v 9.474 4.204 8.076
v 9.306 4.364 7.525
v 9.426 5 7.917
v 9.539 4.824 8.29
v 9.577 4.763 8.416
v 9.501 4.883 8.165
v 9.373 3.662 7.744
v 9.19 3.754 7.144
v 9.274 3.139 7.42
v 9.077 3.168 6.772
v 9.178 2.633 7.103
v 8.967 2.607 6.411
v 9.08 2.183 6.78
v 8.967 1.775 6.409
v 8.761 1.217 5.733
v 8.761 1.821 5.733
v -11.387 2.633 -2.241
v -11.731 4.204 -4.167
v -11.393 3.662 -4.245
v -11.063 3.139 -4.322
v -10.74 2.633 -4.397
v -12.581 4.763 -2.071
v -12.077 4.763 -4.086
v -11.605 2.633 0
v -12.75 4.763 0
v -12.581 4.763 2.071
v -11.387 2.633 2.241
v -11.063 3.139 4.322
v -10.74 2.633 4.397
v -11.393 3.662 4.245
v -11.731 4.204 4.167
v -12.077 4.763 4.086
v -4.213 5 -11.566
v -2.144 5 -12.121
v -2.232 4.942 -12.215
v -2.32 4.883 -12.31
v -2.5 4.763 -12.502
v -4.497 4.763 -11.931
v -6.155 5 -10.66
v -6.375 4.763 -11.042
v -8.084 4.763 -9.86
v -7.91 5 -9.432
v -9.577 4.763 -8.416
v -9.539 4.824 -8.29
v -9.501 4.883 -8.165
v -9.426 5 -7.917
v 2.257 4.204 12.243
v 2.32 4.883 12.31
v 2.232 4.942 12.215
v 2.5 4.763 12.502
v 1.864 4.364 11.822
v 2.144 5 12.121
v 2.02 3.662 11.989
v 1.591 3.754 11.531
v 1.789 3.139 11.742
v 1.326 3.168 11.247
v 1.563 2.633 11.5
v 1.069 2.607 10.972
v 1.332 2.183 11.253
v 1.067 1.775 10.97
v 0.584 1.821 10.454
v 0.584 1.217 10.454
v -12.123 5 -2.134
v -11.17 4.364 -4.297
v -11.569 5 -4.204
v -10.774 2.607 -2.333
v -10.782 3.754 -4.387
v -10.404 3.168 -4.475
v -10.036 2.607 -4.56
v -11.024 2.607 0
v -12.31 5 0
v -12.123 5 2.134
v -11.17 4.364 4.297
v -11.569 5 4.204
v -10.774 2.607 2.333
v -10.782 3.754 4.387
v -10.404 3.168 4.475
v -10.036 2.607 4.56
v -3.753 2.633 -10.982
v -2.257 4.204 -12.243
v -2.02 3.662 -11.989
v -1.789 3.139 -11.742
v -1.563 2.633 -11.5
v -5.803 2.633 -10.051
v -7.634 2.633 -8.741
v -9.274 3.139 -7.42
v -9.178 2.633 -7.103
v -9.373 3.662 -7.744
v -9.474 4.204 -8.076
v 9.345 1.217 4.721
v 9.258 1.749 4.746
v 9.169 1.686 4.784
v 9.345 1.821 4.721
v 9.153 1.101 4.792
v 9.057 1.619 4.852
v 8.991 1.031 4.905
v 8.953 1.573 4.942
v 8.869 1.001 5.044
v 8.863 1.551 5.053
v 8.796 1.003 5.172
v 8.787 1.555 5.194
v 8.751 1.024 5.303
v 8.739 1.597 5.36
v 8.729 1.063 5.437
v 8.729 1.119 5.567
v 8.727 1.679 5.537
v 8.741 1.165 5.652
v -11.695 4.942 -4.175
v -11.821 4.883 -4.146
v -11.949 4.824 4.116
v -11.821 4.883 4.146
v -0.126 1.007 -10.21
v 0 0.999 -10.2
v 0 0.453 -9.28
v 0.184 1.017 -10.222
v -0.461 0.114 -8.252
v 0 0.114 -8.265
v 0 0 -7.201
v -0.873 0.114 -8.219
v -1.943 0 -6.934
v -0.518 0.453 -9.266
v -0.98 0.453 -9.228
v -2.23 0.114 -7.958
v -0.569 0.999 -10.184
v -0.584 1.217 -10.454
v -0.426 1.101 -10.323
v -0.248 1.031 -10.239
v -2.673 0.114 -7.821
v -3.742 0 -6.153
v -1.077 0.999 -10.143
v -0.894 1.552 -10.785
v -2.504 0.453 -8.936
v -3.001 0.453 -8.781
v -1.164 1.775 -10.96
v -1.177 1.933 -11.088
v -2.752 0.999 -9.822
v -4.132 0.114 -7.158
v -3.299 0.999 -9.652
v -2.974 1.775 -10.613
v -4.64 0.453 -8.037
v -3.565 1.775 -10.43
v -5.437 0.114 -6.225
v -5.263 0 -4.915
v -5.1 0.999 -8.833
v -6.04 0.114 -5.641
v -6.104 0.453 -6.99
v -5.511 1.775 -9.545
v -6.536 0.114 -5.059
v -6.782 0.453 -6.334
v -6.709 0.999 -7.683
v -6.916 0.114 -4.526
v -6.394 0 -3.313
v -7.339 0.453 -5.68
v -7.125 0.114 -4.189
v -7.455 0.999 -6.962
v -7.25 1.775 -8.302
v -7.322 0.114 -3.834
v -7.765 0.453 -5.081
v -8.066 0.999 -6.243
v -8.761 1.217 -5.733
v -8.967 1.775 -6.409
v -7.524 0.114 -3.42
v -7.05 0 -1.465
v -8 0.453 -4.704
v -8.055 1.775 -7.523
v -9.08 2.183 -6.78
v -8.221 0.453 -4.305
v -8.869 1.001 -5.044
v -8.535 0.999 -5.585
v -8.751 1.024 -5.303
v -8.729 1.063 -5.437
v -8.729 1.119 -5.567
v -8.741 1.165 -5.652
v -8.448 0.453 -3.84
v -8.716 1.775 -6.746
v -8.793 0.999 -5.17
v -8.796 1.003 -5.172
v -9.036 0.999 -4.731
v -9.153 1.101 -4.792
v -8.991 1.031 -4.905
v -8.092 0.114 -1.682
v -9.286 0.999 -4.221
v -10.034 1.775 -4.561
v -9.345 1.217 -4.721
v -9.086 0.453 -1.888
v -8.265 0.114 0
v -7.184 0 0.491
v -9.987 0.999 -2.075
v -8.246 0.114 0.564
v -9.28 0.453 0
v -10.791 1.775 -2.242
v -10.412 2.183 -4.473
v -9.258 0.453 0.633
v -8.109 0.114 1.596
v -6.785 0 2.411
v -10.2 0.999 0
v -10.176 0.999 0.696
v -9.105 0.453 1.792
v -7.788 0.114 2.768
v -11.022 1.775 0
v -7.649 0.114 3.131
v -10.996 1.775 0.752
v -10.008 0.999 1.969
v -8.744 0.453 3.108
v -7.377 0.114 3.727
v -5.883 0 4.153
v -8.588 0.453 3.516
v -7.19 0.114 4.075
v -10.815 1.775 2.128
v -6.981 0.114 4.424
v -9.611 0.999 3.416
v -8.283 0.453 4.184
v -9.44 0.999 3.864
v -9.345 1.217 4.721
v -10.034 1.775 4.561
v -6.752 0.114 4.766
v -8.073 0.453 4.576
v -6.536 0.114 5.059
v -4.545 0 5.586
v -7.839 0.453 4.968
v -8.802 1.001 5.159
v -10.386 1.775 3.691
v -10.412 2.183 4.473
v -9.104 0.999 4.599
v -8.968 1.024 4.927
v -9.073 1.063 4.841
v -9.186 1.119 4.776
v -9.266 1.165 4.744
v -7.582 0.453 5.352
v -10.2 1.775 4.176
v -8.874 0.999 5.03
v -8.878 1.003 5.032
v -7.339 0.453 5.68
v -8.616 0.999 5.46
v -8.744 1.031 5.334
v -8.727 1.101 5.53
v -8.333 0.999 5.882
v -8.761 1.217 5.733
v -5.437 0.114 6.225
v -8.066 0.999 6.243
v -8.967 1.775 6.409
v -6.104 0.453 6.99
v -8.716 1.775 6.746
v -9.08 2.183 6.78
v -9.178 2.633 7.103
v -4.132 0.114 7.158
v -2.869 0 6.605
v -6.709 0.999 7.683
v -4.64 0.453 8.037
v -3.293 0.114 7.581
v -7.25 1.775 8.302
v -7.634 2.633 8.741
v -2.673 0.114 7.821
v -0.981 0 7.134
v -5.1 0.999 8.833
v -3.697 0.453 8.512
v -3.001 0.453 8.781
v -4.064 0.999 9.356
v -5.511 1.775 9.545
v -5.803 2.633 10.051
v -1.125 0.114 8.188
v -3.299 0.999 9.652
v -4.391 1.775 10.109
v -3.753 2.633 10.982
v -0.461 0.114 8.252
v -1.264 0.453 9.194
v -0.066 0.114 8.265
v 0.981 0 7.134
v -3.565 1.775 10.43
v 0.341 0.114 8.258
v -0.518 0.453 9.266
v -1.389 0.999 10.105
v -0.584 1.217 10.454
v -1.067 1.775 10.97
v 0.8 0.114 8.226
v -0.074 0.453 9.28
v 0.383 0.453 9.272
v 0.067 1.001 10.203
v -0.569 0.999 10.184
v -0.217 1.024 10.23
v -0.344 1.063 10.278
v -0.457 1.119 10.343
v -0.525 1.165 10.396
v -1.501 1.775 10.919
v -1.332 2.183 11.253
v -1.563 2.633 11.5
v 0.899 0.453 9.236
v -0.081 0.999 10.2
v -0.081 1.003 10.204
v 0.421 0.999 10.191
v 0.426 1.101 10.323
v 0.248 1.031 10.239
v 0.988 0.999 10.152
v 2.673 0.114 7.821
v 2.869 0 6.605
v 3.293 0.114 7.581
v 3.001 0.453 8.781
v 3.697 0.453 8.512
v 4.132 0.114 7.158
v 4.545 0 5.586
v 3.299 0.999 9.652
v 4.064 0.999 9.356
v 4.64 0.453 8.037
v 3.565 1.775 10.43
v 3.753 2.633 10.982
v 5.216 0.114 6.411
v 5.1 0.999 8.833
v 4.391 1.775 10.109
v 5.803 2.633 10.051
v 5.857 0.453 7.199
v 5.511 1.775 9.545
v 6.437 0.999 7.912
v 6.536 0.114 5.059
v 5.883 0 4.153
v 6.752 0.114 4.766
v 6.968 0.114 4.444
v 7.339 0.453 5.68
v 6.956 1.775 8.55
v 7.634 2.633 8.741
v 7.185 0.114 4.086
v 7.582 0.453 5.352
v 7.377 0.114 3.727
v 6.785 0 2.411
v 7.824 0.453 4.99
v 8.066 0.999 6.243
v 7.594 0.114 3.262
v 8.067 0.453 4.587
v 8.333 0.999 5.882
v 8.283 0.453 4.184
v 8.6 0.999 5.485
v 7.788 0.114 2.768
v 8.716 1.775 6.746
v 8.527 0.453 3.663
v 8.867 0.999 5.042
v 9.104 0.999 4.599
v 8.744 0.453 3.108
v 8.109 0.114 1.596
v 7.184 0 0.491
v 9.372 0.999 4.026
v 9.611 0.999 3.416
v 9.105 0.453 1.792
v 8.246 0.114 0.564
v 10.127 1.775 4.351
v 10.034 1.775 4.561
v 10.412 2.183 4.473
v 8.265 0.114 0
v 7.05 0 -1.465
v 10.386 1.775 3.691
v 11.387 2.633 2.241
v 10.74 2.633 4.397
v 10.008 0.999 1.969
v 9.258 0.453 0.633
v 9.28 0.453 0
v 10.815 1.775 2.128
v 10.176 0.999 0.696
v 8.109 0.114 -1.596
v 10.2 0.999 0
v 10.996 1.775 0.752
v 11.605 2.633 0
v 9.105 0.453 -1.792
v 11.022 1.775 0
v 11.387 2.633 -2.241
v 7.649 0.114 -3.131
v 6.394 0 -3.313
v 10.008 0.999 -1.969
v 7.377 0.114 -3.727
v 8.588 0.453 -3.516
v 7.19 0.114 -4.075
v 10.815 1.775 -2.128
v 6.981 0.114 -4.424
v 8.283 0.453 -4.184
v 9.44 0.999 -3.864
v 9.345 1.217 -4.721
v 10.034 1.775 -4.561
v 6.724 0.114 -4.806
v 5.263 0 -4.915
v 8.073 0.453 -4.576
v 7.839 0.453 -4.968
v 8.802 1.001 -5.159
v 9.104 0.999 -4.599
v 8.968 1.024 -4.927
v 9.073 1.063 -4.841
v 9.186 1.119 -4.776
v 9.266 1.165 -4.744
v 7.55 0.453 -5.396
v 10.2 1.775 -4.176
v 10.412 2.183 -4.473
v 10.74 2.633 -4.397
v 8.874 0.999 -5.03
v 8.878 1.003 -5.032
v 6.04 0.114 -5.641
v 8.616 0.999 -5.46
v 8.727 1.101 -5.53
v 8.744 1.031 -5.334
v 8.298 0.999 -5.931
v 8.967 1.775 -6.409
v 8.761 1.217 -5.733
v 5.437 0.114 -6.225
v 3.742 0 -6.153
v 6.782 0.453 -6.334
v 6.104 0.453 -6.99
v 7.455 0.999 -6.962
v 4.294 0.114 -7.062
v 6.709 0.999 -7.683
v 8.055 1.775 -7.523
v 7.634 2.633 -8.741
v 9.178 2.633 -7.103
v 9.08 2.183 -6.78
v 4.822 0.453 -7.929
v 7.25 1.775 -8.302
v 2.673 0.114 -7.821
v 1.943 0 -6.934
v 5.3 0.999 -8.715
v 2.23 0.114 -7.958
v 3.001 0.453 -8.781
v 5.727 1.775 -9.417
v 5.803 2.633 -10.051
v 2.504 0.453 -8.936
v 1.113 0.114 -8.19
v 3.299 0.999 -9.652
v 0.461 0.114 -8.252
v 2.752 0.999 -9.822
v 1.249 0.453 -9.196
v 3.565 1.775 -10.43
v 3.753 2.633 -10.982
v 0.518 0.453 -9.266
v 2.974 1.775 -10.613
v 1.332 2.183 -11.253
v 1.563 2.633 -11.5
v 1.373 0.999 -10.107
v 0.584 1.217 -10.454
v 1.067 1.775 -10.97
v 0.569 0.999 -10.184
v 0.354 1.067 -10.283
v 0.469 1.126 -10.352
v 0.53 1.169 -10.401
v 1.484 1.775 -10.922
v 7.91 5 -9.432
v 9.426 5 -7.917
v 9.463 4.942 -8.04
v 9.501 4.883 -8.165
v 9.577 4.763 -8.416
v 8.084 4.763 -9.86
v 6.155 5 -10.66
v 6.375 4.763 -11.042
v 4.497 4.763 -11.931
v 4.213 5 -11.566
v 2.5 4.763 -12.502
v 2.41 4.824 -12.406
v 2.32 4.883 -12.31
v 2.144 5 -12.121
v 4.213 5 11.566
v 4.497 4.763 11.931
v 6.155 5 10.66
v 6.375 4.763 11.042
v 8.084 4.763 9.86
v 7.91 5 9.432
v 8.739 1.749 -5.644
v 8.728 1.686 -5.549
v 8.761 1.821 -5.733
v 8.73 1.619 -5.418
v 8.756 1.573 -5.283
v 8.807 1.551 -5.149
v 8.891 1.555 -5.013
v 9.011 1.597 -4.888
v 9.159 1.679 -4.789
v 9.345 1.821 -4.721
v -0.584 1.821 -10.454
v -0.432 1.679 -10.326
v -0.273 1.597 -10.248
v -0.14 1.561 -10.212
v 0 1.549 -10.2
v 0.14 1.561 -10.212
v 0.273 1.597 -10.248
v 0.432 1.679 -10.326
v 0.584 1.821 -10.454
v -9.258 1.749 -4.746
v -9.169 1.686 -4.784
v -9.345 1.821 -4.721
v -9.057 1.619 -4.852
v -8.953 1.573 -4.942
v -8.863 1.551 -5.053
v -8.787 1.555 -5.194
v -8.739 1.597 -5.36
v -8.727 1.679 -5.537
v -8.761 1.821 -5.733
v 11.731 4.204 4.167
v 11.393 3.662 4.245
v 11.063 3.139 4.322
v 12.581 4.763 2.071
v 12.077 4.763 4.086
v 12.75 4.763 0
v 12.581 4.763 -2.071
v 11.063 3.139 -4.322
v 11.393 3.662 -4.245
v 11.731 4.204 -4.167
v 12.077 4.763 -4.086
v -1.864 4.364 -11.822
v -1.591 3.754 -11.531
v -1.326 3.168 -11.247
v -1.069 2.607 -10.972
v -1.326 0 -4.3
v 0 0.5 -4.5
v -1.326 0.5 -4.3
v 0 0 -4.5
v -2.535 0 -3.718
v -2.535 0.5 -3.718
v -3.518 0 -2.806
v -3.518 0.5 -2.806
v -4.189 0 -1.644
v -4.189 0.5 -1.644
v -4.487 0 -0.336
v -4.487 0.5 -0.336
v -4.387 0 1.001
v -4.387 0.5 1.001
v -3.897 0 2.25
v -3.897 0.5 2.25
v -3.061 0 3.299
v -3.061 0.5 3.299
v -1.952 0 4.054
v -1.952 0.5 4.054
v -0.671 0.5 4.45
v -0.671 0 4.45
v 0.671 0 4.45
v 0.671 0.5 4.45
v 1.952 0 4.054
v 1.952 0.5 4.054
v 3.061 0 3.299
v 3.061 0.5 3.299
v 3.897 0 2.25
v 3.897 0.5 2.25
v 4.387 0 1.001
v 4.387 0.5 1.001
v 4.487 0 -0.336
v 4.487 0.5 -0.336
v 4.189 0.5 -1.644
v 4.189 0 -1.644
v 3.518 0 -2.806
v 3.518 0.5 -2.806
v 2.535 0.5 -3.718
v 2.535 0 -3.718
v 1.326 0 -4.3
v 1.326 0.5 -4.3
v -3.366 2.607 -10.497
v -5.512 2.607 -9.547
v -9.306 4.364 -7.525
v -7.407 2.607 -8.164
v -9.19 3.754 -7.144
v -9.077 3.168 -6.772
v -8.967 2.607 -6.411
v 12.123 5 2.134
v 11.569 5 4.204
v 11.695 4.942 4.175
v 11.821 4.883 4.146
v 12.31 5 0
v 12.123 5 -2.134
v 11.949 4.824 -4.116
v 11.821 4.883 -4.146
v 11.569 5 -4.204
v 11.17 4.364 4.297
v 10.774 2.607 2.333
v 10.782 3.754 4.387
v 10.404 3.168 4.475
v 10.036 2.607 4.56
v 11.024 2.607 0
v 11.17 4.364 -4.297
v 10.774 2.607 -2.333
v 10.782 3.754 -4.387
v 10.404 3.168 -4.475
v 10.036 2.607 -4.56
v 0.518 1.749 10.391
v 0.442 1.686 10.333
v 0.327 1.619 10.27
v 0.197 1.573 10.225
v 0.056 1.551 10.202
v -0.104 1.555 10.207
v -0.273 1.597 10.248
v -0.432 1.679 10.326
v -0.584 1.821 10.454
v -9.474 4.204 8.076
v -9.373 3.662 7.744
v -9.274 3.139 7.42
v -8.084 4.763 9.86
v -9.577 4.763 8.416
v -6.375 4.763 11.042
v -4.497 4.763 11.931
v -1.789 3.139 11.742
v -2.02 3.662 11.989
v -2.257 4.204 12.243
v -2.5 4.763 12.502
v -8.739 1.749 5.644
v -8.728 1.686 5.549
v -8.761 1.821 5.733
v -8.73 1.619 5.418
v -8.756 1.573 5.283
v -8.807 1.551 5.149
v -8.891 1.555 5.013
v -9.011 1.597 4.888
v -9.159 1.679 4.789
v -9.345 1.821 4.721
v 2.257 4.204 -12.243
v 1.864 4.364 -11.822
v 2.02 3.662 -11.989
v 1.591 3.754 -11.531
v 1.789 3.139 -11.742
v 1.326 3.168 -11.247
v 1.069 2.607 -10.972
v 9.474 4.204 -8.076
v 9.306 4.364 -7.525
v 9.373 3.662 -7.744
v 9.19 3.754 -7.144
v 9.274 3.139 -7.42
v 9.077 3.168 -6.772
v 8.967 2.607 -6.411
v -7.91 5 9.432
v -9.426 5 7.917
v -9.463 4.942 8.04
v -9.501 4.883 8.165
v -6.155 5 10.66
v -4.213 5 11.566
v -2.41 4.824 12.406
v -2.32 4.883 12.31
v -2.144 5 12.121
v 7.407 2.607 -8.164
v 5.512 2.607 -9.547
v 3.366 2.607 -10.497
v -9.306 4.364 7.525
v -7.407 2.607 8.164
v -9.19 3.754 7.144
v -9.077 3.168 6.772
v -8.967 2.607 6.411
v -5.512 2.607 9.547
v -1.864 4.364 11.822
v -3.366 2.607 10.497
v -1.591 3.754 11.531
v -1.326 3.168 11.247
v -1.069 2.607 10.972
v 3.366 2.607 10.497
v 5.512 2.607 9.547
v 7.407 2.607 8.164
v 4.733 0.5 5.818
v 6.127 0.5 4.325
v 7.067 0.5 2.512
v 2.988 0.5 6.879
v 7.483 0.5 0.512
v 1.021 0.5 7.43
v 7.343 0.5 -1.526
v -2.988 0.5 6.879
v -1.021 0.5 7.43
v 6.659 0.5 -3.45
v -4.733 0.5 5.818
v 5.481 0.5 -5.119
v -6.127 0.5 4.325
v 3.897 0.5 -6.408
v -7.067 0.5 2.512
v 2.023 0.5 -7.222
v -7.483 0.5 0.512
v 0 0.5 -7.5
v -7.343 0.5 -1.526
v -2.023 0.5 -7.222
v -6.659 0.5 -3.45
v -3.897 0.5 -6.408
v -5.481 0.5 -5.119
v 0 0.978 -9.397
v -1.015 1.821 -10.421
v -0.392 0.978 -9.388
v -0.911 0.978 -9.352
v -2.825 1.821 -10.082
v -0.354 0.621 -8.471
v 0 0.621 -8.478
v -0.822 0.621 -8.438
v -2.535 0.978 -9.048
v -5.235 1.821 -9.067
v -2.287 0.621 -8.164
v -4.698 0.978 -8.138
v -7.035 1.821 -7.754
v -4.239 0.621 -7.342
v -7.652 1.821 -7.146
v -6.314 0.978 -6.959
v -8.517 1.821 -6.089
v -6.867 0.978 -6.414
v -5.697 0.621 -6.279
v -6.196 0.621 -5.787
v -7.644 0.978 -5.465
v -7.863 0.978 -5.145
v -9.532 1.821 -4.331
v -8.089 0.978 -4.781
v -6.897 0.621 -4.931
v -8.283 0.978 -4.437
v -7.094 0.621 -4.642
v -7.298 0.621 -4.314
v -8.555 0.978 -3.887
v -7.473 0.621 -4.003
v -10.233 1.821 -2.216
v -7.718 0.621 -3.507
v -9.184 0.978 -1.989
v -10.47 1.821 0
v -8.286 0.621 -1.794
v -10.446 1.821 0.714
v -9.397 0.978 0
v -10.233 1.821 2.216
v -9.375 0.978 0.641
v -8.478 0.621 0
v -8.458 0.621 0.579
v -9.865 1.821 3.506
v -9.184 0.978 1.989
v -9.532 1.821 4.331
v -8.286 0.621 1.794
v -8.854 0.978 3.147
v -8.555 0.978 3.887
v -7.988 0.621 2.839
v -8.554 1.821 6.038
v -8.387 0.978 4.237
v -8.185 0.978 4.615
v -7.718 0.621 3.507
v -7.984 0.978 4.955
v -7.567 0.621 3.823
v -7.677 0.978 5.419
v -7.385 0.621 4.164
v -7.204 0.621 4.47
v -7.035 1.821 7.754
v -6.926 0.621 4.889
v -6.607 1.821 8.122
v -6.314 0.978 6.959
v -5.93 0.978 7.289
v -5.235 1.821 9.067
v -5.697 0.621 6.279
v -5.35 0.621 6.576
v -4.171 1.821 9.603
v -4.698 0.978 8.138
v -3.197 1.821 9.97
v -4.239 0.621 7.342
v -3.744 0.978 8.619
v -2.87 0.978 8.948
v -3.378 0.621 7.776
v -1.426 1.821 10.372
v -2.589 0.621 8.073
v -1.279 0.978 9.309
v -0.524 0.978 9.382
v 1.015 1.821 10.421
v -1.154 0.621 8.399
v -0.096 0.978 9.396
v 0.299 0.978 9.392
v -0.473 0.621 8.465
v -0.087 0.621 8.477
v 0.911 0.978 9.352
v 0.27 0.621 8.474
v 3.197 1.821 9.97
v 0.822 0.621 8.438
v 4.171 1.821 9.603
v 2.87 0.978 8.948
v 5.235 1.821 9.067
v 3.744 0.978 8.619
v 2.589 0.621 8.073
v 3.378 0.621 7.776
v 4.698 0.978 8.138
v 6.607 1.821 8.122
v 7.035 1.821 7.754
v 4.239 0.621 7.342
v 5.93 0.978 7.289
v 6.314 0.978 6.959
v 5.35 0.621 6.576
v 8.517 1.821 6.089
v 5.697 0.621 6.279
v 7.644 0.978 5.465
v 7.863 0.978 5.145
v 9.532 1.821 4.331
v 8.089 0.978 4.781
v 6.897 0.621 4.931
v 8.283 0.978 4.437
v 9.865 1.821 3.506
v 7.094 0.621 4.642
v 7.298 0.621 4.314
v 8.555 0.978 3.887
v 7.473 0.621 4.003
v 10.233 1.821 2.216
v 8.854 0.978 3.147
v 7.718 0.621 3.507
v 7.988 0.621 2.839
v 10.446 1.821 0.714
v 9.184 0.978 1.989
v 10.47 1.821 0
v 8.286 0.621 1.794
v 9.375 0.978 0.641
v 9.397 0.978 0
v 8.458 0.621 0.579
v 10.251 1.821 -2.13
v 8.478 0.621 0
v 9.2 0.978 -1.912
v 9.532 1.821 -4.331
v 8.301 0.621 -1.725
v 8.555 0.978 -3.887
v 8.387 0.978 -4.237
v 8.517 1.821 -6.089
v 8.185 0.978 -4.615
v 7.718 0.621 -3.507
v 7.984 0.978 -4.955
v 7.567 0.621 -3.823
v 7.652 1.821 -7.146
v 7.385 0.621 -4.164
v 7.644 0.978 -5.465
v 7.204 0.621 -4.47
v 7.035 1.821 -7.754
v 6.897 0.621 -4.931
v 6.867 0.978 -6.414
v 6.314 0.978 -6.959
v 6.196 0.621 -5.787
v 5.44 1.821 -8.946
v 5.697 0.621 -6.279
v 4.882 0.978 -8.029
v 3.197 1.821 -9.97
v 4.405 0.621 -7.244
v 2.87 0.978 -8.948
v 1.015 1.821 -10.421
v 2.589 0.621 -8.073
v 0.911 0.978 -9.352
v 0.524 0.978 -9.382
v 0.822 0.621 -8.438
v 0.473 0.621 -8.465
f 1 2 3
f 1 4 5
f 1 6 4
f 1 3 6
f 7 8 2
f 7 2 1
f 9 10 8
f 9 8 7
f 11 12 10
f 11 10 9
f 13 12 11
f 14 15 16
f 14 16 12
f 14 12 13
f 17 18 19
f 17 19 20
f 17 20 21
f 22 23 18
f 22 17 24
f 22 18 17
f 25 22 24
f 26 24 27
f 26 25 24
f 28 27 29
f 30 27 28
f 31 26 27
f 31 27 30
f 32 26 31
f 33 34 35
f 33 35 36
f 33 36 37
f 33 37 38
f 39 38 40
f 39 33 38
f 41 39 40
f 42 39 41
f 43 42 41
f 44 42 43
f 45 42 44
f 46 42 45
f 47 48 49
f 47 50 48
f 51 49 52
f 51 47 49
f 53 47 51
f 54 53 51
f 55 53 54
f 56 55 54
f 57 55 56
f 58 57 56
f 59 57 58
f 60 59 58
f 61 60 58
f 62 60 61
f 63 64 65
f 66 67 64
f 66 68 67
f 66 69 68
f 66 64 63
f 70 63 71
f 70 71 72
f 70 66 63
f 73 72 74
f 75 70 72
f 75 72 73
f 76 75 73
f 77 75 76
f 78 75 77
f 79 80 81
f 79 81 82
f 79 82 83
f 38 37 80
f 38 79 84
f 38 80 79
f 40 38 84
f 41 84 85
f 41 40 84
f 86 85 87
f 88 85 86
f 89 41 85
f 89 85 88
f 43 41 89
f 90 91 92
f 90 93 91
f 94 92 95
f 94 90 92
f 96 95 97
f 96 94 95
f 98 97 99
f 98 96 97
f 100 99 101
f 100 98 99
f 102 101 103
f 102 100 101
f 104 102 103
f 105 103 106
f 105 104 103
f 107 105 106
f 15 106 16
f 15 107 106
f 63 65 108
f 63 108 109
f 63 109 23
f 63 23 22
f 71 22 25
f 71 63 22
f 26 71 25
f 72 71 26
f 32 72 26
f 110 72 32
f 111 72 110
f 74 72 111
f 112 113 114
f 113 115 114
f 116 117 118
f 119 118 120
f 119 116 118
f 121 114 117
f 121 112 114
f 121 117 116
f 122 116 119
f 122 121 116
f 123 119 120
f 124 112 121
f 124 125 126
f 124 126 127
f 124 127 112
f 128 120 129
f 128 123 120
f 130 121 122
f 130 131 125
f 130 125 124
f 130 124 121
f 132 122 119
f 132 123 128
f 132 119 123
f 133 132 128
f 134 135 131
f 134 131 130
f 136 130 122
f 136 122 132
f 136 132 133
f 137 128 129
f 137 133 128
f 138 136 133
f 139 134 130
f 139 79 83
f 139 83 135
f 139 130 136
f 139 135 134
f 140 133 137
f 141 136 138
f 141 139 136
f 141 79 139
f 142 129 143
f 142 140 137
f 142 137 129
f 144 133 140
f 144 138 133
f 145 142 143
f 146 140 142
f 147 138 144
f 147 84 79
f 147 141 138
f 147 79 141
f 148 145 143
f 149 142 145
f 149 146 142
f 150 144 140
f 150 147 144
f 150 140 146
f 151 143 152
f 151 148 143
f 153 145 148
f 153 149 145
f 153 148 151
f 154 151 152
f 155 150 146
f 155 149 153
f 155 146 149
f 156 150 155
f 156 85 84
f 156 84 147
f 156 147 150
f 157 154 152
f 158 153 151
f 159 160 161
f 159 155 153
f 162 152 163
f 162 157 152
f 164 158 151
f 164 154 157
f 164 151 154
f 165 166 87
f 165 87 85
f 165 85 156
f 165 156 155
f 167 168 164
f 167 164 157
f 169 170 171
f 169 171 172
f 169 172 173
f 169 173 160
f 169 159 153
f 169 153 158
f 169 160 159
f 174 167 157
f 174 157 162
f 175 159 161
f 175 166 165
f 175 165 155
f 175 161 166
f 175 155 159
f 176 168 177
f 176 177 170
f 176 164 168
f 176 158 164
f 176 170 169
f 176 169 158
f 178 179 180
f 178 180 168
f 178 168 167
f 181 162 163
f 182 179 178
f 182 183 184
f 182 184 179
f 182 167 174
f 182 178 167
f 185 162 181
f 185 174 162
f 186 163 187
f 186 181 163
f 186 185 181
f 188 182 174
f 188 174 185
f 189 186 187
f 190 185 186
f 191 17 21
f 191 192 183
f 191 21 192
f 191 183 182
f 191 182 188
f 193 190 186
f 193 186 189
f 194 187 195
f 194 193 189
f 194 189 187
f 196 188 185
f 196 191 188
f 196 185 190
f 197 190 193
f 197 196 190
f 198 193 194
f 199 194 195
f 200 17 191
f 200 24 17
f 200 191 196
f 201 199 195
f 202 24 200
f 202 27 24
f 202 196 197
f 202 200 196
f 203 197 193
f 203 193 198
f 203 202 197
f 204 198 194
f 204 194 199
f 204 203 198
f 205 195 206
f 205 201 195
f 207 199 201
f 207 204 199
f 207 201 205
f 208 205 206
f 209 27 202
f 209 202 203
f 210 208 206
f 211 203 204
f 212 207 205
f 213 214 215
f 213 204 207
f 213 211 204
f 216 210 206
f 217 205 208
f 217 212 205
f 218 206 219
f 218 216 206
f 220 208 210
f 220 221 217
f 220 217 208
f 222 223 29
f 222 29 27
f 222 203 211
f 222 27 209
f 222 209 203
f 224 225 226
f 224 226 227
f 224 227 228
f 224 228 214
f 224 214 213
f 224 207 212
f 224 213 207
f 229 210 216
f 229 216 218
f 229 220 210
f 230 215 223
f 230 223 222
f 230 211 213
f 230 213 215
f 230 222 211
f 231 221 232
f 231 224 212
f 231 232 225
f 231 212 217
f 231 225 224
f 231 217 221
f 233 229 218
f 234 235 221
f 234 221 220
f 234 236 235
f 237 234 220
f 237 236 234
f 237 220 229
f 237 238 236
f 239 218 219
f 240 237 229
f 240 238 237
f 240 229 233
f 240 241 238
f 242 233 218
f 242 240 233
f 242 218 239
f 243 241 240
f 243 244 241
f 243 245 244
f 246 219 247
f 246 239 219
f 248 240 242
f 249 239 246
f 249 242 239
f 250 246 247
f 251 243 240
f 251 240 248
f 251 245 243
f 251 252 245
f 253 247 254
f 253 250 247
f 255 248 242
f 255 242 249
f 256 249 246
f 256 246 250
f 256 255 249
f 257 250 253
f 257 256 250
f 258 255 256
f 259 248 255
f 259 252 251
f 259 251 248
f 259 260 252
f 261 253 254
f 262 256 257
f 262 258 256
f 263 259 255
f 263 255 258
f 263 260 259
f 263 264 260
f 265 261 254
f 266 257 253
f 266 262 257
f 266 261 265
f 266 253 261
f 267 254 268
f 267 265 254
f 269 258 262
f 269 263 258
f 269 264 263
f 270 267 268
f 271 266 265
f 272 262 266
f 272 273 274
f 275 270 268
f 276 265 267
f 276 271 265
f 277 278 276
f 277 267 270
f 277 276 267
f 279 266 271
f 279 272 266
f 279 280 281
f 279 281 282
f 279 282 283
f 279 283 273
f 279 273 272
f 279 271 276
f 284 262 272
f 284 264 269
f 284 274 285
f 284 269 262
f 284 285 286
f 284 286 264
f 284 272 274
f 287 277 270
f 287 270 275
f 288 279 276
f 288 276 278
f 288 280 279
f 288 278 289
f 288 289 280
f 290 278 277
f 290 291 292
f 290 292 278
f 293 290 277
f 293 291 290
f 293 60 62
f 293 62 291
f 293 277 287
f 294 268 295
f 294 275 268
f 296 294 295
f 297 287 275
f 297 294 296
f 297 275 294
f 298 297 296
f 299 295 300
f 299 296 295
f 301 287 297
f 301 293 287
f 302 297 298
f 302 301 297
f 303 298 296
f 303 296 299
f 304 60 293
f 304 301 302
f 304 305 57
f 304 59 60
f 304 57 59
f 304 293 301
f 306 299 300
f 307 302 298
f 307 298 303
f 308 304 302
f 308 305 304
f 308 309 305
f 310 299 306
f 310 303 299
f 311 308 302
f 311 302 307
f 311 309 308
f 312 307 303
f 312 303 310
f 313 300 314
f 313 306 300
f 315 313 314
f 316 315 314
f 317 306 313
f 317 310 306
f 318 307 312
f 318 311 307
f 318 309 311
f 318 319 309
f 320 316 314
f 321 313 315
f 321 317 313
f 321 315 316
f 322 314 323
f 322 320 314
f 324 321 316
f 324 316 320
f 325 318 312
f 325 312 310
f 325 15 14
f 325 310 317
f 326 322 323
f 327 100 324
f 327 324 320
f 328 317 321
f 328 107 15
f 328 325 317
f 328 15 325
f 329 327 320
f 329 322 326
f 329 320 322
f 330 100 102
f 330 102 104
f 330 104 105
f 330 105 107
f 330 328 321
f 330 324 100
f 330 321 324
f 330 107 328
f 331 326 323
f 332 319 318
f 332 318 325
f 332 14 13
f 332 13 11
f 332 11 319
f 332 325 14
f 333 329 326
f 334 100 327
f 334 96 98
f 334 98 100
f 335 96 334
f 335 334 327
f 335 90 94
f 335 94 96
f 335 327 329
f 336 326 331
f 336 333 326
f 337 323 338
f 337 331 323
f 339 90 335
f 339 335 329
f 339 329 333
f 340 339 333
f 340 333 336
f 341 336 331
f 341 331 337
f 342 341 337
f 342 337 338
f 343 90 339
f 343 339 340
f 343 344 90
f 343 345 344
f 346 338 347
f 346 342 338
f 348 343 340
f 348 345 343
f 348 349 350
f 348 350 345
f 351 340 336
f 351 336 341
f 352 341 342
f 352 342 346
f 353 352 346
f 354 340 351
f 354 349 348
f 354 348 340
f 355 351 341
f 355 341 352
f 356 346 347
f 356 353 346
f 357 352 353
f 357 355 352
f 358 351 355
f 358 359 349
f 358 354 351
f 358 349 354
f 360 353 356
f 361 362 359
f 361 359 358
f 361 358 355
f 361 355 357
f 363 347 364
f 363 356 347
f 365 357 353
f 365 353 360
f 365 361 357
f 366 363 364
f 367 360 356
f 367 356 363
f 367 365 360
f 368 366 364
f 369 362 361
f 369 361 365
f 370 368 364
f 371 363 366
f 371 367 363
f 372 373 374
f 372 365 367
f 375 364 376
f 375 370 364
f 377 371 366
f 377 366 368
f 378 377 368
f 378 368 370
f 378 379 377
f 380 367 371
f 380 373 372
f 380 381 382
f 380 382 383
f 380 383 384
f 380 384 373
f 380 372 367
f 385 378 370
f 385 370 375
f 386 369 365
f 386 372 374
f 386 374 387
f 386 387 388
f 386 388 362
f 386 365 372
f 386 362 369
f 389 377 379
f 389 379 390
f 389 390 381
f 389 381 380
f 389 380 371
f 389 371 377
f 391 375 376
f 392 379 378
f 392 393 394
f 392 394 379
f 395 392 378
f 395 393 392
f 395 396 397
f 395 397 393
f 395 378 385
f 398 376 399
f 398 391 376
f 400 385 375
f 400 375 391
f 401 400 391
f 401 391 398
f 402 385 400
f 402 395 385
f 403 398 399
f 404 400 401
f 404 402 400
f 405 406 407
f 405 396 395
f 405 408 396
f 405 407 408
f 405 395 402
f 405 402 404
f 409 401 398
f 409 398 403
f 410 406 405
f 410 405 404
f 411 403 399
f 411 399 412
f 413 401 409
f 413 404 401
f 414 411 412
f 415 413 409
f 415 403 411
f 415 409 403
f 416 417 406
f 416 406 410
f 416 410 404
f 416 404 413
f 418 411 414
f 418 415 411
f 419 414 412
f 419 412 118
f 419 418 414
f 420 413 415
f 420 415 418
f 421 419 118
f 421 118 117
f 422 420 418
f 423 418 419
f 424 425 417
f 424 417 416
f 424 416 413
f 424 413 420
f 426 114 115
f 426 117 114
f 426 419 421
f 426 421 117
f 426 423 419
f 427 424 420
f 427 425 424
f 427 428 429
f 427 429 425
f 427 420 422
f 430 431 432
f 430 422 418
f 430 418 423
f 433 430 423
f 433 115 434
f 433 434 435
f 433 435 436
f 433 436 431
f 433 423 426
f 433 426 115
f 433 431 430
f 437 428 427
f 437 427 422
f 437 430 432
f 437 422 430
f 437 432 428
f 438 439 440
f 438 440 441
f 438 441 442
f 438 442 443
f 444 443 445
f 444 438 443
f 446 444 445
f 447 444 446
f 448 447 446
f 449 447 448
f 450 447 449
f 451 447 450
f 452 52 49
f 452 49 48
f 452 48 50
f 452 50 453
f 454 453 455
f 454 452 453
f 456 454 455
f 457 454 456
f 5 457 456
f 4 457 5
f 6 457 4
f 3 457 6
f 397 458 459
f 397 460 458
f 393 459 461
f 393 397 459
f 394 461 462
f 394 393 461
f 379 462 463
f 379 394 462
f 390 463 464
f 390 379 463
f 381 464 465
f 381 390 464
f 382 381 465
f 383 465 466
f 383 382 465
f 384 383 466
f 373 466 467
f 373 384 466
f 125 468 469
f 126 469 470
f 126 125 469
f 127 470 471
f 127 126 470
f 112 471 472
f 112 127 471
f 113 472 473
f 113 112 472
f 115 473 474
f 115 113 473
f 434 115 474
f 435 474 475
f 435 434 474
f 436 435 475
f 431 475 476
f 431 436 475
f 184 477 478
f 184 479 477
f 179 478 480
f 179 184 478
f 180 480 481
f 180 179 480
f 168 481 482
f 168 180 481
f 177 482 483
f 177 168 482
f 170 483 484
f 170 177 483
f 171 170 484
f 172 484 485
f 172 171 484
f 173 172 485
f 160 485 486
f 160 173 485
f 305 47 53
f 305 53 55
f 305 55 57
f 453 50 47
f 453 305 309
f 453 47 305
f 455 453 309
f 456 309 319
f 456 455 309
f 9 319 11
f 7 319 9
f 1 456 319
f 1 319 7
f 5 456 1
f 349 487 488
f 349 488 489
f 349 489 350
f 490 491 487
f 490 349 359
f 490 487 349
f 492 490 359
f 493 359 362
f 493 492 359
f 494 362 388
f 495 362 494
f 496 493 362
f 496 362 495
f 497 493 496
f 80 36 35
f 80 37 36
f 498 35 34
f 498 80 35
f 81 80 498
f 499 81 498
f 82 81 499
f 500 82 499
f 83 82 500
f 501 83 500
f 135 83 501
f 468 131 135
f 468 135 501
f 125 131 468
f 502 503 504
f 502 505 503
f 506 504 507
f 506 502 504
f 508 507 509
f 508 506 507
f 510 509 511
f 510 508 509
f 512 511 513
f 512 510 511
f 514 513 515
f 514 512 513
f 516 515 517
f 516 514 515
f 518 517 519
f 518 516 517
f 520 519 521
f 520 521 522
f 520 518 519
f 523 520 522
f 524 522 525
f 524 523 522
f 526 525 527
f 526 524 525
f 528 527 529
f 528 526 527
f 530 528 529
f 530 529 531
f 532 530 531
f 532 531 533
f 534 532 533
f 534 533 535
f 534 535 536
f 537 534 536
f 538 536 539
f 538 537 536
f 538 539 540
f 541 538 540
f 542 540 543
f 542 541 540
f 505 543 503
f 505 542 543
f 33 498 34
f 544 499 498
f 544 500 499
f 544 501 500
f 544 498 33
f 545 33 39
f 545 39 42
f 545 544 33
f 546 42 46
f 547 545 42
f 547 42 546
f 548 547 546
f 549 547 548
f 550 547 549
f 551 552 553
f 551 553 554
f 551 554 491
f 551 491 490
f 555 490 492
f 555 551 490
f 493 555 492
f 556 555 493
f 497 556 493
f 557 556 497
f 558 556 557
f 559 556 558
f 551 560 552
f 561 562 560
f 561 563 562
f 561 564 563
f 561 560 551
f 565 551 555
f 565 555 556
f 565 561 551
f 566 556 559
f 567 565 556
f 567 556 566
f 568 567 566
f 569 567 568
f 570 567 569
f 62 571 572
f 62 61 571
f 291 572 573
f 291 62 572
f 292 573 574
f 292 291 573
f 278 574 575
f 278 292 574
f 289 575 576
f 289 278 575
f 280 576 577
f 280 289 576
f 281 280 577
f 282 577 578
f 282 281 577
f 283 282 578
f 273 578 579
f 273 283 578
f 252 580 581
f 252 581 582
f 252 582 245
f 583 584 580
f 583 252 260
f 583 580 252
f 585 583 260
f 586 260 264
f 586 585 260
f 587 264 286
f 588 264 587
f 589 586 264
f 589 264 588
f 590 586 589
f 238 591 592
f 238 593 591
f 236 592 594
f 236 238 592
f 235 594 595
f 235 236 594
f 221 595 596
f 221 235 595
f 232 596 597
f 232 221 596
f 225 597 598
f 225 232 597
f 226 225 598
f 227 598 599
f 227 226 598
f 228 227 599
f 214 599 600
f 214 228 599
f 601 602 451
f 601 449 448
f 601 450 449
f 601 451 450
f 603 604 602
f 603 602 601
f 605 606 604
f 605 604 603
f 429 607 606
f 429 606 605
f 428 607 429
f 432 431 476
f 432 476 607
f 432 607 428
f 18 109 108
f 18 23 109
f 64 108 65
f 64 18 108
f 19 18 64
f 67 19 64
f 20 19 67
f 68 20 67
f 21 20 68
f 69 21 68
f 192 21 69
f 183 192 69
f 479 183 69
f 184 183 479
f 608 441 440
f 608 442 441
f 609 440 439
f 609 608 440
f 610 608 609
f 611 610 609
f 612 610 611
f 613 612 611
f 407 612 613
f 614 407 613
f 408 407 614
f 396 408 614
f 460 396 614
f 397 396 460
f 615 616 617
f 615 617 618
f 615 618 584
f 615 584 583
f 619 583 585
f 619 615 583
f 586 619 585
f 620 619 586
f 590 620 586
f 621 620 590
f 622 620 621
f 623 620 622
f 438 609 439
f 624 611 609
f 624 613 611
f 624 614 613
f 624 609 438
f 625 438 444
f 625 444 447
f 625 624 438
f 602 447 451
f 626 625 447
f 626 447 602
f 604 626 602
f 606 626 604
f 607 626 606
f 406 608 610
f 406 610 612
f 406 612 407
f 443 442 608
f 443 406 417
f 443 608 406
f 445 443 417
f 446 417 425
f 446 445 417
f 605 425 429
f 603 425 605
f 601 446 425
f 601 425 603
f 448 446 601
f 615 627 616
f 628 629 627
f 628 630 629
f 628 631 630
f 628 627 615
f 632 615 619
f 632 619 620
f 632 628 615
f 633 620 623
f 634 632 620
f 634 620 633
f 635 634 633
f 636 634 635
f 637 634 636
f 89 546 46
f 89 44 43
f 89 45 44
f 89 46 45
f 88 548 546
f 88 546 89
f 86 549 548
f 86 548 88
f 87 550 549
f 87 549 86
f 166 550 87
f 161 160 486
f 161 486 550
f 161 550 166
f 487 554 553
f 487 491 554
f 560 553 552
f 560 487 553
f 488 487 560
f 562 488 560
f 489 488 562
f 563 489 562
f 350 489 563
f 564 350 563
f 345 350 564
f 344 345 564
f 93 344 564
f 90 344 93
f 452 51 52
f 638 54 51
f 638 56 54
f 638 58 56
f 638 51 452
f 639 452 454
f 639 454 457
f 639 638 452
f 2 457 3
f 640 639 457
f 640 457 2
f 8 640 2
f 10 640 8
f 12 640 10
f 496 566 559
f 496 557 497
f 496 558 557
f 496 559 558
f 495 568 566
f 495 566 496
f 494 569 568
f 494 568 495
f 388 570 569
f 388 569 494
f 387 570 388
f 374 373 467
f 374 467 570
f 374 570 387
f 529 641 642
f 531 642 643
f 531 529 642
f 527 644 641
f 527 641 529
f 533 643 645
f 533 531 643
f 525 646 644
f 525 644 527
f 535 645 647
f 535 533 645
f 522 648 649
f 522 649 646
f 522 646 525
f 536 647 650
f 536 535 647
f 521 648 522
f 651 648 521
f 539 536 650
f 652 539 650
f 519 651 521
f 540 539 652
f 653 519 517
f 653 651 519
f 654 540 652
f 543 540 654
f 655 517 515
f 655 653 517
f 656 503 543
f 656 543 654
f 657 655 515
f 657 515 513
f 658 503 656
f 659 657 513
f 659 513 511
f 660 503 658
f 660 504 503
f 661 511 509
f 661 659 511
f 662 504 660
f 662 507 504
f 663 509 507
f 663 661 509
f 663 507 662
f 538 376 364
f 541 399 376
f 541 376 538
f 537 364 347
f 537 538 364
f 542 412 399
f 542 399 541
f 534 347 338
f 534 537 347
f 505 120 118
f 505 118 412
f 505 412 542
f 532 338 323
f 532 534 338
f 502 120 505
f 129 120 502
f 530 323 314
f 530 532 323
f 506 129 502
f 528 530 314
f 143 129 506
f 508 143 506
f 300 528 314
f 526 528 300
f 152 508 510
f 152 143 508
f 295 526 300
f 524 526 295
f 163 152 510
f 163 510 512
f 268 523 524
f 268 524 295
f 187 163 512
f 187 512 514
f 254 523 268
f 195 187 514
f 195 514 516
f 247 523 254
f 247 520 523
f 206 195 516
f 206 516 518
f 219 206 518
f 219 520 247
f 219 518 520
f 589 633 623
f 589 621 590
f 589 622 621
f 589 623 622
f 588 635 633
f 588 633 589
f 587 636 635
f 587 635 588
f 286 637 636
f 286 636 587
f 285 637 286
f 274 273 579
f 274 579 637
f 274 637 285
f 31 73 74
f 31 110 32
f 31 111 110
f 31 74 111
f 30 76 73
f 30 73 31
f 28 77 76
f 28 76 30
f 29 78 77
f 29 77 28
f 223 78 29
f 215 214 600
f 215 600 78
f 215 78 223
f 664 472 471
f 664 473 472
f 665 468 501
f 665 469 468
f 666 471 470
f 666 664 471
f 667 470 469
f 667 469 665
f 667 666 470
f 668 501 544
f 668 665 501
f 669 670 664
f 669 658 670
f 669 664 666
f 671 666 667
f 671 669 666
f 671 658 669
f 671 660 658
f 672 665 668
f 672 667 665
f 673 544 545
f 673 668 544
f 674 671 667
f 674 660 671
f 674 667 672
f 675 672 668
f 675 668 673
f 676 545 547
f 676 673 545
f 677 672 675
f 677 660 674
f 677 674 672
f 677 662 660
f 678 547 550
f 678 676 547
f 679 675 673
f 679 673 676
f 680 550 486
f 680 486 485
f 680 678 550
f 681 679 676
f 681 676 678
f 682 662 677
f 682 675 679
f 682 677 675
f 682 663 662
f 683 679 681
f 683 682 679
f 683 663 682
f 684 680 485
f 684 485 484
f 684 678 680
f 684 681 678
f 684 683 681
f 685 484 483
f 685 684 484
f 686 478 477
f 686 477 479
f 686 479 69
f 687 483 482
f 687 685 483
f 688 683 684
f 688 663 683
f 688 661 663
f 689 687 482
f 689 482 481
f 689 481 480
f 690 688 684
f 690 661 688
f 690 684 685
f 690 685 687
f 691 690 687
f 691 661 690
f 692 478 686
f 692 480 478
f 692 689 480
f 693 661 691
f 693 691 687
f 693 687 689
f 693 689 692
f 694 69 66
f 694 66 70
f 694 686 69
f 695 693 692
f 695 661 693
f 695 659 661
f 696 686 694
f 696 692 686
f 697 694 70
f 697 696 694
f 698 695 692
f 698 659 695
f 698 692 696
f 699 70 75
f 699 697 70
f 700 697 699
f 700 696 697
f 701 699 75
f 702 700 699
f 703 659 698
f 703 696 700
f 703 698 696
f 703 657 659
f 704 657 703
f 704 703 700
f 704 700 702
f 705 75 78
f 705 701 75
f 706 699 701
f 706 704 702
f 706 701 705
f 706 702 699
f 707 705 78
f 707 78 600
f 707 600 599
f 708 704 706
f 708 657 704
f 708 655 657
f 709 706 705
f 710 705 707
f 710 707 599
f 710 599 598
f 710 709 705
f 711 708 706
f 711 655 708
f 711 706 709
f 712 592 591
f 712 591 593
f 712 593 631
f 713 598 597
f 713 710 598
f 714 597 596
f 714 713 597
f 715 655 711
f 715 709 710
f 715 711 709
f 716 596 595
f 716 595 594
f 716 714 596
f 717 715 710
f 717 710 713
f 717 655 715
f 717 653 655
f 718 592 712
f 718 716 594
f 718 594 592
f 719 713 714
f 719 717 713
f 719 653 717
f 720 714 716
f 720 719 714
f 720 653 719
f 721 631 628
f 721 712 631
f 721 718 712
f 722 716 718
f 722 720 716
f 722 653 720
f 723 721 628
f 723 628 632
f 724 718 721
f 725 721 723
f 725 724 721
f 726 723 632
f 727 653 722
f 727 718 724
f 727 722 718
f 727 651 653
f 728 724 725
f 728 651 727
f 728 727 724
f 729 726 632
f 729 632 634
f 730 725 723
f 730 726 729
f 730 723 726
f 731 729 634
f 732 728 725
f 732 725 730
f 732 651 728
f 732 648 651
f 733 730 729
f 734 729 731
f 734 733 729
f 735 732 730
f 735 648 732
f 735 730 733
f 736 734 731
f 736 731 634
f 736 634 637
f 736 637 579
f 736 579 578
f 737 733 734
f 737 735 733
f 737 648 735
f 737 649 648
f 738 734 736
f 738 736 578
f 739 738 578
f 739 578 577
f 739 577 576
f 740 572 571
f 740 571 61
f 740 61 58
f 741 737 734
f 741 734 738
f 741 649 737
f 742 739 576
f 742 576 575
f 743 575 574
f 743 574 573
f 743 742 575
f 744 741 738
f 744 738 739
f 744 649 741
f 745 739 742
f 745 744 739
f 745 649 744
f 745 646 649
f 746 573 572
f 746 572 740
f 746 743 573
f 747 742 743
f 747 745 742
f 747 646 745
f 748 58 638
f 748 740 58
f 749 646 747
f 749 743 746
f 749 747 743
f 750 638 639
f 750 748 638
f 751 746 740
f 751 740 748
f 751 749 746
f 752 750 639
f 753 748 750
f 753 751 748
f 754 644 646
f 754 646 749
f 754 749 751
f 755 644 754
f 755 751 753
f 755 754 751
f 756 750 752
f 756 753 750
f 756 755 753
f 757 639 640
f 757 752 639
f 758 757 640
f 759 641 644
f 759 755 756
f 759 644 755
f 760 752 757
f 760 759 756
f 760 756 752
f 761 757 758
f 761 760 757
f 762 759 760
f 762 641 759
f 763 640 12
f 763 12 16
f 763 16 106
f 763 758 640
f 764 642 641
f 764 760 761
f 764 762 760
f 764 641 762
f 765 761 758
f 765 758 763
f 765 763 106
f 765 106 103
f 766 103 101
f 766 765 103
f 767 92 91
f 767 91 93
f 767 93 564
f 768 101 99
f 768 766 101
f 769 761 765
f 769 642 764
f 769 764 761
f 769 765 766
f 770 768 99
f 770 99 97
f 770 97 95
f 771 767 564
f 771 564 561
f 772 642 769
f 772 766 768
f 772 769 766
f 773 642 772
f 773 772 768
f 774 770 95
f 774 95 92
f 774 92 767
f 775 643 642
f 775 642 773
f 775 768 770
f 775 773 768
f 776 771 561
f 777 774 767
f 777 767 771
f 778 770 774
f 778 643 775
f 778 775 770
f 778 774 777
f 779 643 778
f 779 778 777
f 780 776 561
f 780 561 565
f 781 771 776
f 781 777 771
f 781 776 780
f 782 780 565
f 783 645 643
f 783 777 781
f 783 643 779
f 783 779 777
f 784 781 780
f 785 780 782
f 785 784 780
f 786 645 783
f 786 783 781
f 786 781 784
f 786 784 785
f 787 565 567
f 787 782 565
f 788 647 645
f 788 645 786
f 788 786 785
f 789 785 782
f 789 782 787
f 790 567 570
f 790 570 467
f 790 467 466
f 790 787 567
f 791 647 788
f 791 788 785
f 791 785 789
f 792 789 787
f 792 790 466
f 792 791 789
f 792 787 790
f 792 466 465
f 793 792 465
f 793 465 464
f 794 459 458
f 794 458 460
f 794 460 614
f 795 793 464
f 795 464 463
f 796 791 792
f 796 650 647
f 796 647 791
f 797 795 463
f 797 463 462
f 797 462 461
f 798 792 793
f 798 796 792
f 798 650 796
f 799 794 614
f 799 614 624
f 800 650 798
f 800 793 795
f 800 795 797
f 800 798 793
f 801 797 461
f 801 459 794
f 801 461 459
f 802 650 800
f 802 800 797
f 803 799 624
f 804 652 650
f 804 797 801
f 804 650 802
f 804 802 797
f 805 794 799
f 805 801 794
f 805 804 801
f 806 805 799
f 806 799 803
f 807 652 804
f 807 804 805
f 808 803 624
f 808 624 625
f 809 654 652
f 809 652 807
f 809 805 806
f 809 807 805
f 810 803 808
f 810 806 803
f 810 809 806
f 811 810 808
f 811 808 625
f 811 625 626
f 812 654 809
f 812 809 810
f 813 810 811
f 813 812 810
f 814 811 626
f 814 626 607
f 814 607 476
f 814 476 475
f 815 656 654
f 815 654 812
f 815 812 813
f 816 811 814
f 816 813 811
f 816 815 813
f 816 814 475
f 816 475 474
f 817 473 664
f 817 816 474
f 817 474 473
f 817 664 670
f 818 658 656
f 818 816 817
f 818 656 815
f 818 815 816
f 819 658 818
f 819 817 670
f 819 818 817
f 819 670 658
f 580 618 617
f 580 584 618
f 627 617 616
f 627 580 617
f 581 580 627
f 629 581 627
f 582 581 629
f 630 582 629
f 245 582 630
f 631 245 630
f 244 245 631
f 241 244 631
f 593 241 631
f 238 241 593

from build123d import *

# Parameters (mm, degrees)
ENL_V_START                  = -1
ENL_V_MAT_EXTRU_1_DEPTH      = 7
R_P_TITION_CIRCULAIRE1_COUNT = 6


with BuildPart() as part:
    # Esquisse2 → Révolution1 (revolve)
    with BuildSketch(Plane.XY, mode=Mode.PRIVATE) as r_volution1_sk:
        with BuildLine():
            Line((4.5, 0), (7.201056776, 0))
            ThreePointArc((7.201056776, 0), (9.766863159, 0.70853899), (11.605479997, 2.633344958))
            Line((11.605479997, 2.633344958), (12.75, 4.763334496))
            Line((12.75, 4.763334496), (12.309557678, 5))
            Line((12.309557678, 5), (11.023538577, 2.606675967))
            ThreePointArc((11.023538577, 2.606675967), (9.552645106, 1.066831192), (7.5, 0.5))
            Line((7.5, 0.5), (4.5, 0.5))
            Line((4.5, 0.5), (4.5, 0))
        make_face()
    revolve(r_volution1_sk.sketch.rotate(Axis((0, 0, 0), (0, 1, 0)), 90), axis=Axis((0, 0, 0), (0, 1, 0)))  # turned: the seam where the file's is

    # Esquisse3 → Enlèv. mat.-Extru.1 (cut)
    with BuildSketch(Plane(origin=(0, 0, 0), x_dir=(1, 0, 0), z_dir=(0, 1, 0)).offset(ENL_V_START)):
        with BuildLine():
            Line((-49.624128755, 62.90410991), (-2.5, 12.50249975))
            Line((-2.5, 12.50249975), (-0.584366138, 10.453633624))
            ThreePointArc((-0.584366138, 10.453633624), (0, 10.2), (0.584366138, 10.453633624))
            Line((0.584366138, 10.453633624), (2.5, 12.50249975))
            Line((2.5, 12.50249975), (49.624128755, 62.90410991))
            Line((49.624128755, 62.90410991), (49.624128755, 200.904194224))
            Line((49.624128755, 200.904194224), (-49.624128755, 200.904194224))
            Line((-49.624128755, 200.904194224), (-49.624128755, 62.90410991))
        make_face()
    enl_v_mat_extru_1 = extrude(amount=ENL_V_MAT_EXTRU_1_DEPTH, mode=Mode.SUBTRACT)

    # Répétition circulaire1: Enlèv. mat.-Extru.1 ×6 about axis
    r_p_tition_circulaire1_axis = Axis((0, 0, 0), (0, 1, 0))
    for i in range(1, R_P_TITION_CIRCULAIRE1_COUNT):
        add(enl_v_mat_extru_1.rotate(r_p_tition_circulaire1_axis, i * 360 / R_P_TITION_CIRCULAIRE1_COUNT), mode=Mode.SUBTRACT)


solid = part.part
